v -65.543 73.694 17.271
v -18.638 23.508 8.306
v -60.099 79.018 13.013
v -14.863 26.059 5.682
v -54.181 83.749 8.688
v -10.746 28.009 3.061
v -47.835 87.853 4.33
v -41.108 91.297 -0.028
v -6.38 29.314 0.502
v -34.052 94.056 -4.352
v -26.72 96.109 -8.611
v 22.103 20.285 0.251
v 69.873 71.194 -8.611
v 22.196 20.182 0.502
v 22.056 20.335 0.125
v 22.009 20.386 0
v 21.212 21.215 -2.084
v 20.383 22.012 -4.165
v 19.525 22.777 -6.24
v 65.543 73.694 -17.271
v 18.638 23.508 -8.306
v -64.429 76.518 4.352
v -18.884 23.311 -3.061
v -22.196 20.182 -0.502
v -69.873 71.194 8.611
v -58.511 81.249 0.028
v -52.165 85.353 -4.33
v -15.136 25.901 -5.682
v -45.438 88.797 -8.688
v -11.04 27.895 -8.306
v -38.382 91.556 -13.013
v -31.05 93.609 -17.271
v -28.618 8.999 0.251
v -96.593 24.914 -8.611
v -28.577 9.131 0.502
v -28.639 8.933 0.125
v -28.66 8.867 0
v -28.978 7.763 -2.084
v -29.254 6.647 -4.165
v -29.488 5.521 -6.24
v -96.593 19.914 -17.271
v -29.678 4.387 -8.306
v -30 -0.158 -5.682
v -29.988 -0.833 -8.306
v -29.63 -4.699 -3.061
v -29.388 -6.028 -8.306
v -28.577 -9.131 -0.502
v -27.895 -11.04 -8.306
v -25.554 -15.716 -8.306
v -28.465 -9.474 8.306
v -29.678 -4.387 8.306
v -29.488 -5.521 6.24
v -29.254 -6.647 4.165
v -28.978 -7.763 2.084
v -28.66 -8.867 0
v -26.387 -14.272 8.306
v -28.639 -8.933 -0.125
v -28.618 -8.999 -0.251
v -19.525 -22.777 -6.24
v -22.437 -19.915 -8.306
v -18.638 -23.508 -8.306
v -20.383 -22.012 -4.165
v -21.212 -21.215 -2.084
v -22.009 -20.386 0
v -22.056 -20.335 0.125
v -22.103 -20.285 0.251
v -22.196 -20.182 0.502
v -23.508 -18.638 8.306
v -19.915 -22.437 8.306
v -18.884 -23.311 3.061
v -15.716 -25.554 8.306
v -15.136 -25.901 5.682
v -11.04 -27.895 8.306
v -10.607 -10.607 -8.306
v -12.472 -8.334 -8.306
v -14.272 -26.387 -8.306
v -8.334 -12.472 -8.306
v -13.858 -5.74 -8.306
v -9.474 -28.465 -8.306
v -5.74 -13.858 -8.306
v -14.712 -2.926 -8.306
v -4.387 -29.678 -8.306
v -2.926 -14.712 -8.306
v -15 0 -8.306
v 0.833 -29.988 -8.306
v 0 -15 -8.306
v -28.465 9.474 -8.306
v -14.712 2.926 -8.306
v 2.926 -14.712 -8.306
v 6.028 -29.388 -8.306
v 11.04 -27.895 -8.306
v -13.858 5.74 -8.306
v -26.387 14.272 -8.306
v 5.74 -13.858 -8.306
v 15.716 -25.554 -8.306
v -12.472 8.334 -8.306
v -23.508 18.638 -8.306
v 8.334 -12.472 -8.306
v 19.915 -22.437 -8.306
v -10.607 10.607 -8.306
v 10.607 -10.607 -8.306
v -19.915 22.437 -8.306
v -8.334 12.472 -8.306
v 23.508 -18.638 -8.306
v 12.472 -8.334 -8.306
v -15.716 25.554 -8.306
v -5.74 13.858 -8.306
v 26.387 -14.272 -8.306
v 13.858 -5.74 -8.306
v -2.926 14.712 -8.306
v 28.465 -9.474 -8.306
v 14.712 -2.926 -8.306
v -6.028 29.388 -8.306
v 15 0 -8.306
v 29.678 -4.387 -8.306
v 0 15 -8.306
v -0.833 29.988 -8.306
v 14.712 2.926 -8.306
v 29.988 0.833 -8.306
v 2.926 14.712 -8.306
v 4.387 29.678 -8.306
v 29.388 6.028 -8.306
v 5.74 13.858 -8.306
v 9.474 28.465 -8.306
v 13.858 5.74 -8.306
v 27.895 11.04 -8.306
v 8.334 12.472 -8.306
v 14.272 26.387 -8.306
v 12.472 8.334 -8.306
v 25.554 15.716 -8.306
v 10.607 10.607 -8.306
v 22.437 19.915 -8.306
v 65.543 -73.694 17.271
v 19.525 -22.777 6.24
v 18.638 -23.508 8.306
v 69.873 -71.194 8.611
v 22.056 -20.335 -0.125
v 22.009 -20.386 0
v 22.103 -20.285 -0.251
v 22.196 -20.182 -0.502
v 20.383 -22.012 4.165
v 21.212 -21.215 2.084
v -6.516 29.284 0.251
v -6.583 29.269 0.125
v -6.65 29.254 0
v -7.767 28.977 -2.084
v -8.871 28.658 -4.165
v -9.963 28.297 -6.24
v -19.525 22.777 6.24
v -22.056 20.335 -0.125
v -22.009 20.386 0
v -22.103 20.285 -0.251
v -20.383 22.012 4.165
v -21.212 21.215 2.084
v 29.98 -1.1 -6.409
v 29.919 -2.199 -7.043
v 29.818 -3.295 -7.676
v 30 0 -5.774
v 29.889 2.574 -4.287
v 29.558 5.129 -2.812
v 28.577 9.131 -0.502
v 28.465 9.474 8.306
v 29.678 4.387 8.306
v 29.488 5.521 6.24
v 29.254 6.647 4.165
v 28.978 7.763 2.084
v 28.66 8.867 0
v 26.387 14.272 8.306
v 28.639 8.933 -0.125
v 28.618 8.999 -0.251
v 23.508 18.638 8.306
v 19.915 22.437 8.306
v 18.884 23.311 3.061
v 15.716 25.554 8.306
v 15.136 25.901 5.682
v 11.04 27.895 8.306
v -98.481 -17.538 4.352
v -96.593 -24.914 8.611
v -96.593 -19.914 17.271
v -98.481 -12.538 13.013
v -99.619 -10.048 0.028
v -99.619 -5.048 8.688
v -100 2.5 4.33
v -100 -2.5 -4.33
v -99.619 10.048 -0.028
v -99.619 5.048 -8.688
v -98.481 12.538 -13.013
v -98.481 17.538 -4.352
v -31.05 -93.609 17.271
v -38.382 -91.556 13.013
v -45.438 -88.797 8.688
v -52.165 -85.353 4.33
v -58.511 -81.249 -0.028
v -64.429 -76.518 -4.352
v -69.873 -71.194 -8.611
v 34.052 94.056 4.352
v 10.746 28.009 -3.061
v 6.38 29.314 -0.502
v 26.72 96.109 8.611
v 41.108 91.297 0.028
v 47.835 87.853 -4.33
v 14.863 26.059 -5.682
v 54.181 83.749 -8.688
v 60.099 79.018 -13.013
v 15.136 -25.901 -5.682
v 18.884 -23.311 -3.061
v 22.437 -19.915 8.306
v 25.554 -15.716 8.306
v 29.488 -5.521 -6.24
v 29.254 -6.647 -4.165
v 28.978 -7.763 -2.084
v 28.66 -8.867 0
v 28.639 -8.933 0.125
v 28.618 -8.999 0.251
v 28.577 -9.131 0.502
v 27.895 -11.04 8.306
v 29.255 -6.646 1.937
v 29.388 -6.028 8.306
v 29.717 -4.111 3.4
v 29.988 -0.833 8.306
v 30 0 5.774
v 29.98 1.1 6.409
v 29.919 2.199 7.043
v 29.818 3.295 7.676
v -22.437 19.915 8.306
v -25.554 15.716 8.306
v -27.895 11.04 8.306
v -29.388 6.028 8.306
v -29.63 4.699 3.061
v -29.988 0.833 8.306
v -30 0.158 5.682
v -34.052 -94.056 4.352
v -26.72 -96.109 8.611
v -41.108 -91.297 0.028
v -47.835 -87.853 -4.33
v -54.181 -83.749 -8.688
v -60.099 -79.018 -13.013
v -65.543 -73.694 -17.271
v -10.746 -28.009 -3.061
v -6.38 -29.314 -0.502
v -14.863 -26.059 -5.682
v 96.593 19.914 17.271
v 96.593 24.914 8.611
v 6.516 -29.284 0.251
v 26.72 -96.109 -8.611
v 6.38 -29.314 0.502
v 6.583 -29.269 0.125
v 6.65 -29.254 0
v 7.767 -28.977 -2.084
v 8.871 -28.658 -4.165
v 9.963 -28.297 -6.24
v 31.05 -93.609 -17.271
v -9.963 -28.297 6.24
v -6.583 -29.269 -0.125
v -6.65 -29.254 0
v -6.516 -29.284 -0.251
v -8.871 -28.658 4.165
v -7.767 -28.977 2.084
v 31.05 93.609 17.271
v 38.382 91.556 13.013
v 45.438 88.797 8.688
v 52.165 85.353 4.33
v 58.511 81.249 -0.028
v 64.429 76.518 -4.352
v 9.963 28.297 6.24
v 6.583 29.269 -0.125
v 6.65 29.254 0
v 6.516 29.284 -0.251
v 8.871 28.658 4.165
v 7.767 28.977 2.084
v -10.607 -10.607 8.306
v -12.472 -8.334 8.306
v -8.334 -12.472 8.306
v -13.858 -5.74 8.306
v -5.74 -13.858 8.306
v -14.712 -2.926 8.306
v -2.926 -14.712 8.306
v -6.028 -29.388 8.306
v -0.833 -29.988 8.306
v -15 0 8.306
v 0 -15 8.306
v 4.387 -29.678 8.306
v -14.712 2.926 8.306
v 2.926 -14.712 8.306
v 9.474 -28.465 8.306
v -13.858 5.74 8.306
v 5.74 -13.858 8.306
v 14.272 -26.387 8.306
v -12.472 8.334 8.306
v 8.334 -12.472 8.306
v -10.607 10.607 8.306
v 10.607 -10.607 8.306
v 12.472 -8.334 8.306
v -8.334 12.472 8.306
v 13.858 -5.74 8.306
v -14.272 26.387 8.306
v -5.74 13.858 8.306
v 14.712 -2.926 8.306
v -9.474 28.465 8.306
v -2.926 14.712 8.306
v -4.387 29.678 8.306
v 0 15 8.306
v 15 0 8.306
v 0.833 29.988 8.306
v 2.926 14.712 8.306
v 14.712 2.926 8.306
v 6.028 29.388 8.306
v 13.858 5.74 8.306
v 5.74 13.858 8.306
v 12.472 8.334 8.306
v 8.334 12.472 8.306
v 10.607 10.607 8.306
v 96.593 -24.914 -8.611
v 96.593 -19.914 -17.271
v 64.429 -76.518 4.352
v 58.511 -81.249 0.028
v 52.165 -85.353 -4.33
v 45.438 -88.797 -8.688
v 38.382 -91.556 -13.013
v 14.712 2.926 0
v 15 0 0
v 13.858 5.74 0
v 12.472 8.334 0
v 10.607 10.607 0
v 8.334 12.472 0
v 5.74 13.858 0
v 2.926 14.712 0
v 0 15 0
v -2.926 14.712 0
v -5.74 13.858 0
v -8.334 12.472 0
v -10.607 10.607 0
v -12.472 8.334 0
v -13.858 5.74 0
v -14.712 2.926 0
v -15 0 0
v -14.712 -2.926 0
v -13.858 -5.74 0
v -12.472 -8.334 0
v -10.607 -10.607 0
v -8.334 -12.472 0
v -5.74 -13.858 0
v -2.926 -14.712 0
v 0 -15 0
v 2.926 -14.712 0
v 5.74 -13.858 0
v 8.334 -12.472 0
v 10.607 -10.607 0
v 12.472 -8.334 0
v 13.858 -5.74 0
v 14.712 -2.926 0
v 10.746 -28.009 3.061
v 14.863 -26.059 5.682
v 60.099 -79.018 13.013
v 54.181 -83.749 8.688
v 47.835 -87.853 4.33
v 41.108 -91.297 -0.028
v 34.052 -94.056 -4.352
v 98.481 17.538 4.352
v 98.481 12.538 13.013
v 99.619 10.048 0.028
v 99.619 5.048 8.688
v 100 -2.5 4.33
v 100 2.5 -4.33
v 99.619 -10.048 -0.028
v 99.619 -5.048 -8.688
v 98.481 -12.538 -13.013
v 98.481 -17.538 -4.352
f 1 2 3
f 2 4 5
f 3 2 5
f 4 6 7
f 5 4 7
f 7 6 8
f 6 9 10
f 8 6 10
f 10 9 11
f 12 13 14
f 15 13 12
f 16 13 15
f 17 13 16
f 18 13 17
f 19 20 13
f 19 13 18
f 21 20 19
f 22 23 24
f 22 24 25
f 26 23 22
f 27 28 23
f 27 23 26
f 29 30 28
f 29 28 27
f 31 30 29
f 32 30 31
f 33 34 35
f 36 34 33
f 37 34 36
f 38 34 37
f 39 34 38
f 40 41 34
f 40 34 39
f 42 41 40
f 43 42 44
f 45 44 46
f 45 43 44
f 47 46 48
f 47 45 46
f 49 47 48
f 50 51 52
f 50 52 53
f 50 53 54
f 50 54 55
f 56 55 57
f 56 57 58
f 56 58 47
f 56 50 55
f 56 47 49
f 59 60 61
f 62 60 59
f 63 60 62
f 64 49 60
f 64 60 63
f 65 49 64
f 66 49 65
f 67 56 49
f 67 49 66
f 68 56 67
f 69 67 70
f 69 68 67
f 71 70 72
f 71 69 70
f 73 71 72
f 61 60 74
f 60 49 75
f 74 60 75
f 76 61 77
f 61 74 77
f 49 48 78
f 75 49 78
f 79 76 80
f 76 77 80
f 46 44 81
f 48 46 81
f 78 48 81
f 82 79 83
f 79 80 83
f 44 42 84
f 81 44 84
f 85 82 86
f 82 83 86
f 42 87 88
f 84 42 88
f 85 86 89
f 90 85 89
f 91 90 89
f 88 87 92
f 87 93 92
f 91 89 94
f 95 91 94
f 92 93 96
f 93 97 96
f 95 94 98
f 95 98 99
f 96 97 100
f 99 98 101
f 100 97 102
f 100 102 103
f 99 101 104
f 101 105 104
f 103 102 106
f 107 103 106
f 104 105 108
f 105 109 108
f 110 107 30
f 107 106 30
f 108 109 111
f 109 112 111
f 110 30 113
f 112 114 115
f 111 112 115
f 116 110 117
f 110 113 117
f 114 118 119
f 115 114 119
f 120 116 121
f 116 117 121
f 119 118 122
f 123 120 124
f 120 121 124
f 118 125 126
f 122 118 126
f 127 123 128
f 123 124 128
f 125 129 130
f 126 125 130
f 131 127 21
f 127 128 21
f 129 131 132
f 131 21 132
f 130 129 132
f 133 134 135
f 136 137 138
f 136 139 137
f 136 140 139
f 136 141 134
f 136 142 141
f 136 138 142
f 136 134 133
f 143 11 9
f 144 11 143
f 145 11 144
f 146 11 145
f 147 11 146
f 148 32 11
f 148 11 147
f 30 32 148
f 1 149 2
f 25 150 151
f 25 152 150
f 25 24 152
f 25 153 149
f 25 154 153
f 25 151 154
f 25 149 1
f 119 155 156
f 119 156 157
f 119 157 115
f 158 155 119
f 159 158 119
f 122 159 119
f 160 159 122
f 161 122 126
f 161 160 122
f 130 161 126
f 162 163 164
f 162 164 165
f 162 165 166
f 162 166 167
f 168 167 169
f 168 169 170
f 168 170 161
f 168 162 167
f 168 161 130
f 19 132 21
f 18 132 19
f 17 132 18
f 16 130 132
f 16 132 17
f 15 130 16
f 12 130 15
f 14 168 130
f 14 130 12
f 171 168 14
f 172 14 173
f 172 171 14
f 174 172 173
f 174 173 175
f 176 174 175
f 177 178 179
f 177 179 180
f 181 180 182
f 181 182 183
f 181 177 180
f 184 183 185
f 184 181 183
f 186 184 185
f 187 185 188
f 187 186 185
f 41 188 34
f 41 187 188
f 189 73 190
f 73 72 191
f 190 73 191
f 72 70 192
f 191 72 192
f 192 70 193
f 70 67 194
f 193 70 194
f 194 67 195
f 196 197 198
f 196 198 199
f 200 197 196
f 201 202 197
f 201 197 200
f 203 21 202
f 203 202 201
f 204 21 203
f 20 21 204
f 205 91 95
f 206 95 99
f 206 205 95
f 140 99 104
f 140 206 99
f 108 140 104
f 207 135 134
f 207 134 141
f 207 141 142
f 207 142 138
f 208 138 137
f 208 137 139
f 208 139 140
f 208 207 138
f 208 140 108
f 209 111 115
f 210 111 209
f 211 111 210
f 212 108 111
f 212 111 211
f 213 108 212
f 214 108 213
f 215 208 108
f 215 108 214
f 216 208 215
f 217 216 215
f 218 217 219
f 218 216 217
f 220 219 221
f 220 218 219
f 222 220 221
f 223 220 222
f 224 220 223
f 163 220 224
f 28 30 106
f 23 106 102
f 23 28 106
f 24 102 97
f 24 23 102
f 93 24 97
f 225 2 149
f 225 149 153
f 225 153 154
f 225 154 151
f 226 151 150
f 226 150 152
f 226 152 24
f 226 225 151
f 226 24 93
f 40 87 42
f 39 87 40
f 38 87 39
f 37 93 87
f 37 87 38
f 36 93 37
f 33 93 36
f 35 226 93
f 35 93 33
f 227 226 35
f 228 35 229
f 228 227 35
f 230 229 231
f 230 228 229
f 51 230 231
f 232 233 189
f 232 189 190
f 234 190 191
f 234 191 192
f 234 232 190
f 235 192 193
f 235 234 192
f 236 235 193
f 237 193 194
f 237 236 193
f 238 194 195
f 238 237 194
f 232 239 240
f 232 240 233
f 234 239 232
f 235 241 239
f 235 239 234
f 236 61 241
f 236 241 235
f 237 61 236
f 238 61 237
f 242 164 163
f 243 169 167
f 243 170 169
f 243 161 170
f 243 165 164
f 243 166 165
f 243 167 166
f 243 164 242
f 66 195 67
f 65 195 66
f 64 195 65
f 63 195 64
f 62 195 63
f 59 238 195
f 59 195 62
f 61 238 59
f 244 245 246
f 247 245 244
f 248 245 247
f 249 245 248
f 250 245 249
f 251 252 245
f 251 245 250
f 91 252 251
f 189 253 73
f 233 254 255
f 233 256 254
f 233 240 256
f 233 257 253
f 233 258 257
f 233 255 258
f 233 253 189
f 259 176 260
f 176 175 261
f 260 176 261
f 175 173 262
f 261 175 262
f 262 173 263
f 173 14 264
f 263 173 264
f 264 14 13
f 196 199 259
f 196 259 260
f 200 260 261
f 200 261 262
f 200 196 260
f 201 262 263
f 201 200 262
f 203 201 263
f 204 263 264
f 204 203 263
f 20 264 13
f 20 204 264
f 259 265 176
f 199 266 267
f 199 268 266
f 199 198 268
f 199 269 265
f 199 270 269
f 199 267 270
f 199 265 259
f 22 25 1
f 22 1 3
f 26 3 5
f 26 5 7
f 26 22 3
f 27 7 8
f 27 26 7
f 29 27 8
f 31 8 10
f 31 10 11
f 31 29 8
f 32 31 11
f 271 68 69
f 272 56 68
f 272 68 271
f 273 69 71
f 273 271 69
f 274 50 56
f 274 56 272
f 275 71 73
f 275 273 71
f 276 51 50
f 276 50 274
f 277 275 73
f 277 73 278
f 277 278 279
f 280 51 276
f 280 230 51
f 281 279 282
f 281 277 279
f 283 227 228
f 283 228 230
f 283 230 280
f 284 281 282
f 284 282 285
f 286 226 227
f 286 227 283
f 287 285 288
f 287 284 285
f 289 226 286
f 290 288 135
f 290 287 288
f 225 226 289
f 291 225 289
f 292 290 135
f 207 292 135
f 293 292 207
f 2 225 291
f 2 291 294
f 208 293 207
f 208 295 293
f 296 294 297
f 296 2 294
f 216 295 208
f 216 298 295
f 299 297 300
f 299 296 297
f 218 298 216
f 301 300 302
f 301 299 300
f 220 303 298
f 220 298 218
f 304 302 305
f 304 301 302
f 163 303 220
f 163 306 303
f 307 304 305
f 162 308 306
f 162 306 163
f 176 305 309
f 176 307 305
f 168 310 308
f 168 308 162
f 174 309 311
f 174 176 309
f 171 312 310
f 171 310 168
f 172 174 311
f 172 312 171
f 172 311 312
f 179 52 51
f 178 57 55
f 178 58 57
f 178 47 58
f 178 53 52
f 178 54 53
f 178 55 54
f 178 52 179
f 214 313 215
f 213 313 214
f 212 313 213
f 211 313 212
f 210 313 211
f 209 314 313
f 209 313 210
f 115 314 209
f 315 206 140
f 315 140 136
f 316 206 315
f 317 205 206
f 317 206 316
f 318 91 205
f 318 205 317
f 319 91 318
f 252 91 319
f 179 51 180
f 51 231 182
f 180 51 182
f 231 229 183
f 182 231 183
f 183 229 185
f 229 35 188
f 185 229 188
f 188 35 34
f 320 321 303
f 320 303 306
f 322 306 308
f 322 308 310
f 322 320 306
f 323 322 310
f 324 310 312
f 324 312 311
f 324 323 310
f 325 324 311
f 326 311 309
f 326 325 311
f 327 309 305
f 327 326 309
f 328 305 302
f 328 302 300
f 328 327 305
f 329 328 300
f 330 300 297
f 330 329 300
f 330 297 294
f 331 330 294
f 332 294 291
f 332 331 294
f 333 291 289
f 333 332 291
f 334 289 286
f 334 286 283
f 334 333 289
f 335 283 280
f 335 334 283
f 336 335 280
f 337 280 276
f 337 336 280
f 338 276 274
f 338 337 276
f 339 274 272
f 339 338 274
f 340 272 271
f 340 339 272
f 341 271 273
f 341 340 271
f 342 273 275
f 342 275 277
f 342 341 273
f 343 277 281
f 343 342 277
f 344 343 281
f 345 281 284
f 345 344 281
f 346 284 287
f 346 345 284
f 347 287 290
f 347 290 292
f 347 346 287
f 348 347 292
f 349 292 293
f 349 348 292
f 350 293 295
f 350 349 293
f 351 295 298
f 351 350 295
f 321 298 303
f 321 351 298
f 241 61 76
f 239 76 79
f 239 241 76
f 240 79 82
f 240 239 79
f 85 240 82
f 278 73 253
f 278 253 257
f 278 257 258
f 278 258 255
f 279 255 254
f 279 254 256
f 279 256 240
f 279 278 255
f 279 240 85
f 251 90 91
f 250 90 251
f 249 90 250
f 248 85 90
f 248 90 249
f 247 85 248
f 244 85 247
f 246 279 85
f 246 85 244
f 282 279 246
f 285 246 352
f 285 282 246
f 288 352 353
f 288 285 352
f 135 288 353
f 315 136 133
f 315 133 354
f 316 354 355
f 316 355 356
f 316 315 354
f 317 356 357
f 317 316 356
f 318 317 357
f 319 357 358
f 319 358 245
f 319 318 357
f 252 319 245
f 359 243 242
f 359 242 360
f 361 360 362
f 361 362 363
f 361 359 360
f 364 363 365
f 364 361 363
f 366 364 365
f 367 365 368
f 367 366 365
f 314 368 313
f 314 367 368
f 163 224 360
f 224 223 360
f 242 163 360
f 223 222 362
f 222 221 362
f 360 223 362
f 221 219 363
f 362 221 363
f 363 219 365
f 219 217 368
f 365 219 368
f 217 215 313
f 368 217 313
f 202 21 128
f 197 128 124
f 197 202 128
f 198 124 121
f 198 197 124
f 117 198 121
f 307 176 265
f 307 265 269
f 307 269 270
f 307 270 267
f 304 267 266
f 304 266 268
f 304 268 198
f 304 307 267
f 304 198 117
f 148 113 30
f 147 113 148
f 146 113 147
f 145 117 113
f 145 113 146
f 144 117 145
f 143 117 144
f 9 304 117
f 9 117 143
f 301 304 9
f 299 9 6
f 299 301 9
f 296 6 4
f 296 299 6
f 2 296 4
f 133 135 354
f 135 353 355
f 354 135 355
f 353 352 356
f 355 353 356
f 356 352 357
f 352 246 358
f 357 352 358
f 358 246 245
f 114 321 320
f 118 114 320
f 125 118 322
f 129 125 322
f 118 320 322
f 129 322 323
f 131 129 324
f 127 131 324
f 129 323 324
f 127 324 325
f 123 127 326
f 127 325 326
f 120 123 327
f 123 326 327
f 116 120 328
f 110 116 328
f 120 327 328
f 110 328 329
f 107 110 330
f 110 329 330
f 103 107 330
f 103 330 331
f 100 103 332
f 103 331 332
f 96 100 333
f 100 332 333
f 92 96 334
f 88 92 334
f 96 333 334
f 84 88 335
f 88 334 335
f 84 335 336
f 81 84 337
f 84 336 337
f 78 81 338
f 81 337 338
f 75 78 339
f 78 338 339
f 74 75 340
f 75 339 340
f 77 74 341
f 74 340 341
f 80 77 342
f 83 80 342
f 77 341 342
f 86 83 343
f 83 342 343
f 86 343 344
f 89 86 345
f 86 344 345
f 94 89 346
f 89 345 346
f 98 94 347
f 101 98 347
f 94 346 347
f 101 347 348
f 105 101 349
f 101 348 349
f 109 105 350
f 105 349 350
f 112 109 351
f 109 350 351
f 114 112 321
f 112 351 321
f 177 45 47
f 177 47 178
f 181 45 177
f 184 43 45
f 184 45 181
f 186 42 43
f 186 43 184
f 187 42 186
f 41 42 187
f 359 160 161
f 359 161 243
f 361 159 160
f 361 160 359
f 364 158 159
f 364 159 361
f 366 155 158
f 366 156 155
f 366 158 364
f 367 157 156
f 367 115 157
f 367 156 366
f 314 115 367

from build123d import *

# Parameters (mm, degrees)
F3_DEPTH      = 5
F3_DEPTH_BACK = 5
F5_COUNT      = 6
F6_R          = 30
F6_R_2        = 15
F8_DEPTH      = 8.3061646
F8_DEPTH_BACK = 8.3061646


# Not quite as in the source:
# - an extrude ends at something that could not be found from the text; its depth is read off the source's solid
# - a feature of the source that left no trace in its solid (it failed there, or was rolled back) is left out


with BuildPart() as f3:
    # F2 (on line) → F3 (new body, two sides)
    with BuildSketch(Plane(origin=(0, 0, 0), x_dir=(1, 0, 0), z_dir=(0, 0.5, -0.8660254038))) as f3_sk:
        with BuildLine():
            ThreePointArc((25, 0), (24.7861215343, -3.2631548055), (24.1481456572, -6.4704761276))
            Line((24.1481456572, -6.4704761276), (96.5925826289, -25.8819045103))
            ThreePointArc((96.5925826289, -25.8819045103), (99.1444861374, -13.052619222), (100, 0))
            ThreePointArc((100, 0), (99.1444861374, 13.052619222), (96.5925826289, 25.8819045103))
            Line((96.5925826289, 25.8819045103), (24.1481456572, 6.4704761276))
            ThreePointArc((24.1481456572, 6.4704761276), (24.7861215343, 3.2631548055), (25, 0))
        make_face()
    extrude(amount=F3_DEPTH)
    extrude(f3_sk.sketch, amount=-F3_DEPTH_BACK)


with BuildPart() as f5_1:
    # F5: instance of F3
    add(f3.part.rotate(Axis((0, 0, -4.0518213063), (0, 0, -1)), 1 * 360 / F5_COUNT))


with BuildPart() as f5_2:
    # F5: instance of F3
    add(f3.part.rotate(Axis((0, 0, -4.0518213063), (0, 0, -1)), 2 * 360 / F5_COUNT))


with BuildPart() as f5_3:
    # F5: instance of F3
    add(f3.part.rotate(Axis((0, 0, -4.0518213063), (0, 0, -1)), 3 * 360 / F5_COUNT))


with BuildPart() as f5_4:
    # F5: instance of F3
    add(f3.part.rotate(Axis((0, 0, -4.0518213063), (0, 0, -1)), 4 * 360 / F5_COUNT))


with BuildPart() as f5_5:
    # F5: instance of F3
    add(f3.part.rotate(Axis((0, 0, -4.0518213063), (0, 0, -1)), 5 * 360 / F5_COUNT))


with BuildPart() as f3_1:
    add(f3.part)

    add(f5_1.part)  # F8 merges F5_1

    add(f5_2.part)  # F8 merges F5_2

    add(f5_3.part)  # F8 merges F5_3

    add(f5_4.part)  # F8 merges F5_4

    add(f5_5.part)  # F8 merges F5_5
    # F6 (on Top) → F8 (join, two sides)
    with BuildSketch(Plane.XY) as f8_sk:
        Circle(F6_R)
        Circle(F6_R_2, mode=Mode.SUBTRACT)
    extrude(amount=F8_DEPTH)
    extrude(f8_sk.sketch, amount=-F8_DEPTH_BACK)


solid = f3_1.part
